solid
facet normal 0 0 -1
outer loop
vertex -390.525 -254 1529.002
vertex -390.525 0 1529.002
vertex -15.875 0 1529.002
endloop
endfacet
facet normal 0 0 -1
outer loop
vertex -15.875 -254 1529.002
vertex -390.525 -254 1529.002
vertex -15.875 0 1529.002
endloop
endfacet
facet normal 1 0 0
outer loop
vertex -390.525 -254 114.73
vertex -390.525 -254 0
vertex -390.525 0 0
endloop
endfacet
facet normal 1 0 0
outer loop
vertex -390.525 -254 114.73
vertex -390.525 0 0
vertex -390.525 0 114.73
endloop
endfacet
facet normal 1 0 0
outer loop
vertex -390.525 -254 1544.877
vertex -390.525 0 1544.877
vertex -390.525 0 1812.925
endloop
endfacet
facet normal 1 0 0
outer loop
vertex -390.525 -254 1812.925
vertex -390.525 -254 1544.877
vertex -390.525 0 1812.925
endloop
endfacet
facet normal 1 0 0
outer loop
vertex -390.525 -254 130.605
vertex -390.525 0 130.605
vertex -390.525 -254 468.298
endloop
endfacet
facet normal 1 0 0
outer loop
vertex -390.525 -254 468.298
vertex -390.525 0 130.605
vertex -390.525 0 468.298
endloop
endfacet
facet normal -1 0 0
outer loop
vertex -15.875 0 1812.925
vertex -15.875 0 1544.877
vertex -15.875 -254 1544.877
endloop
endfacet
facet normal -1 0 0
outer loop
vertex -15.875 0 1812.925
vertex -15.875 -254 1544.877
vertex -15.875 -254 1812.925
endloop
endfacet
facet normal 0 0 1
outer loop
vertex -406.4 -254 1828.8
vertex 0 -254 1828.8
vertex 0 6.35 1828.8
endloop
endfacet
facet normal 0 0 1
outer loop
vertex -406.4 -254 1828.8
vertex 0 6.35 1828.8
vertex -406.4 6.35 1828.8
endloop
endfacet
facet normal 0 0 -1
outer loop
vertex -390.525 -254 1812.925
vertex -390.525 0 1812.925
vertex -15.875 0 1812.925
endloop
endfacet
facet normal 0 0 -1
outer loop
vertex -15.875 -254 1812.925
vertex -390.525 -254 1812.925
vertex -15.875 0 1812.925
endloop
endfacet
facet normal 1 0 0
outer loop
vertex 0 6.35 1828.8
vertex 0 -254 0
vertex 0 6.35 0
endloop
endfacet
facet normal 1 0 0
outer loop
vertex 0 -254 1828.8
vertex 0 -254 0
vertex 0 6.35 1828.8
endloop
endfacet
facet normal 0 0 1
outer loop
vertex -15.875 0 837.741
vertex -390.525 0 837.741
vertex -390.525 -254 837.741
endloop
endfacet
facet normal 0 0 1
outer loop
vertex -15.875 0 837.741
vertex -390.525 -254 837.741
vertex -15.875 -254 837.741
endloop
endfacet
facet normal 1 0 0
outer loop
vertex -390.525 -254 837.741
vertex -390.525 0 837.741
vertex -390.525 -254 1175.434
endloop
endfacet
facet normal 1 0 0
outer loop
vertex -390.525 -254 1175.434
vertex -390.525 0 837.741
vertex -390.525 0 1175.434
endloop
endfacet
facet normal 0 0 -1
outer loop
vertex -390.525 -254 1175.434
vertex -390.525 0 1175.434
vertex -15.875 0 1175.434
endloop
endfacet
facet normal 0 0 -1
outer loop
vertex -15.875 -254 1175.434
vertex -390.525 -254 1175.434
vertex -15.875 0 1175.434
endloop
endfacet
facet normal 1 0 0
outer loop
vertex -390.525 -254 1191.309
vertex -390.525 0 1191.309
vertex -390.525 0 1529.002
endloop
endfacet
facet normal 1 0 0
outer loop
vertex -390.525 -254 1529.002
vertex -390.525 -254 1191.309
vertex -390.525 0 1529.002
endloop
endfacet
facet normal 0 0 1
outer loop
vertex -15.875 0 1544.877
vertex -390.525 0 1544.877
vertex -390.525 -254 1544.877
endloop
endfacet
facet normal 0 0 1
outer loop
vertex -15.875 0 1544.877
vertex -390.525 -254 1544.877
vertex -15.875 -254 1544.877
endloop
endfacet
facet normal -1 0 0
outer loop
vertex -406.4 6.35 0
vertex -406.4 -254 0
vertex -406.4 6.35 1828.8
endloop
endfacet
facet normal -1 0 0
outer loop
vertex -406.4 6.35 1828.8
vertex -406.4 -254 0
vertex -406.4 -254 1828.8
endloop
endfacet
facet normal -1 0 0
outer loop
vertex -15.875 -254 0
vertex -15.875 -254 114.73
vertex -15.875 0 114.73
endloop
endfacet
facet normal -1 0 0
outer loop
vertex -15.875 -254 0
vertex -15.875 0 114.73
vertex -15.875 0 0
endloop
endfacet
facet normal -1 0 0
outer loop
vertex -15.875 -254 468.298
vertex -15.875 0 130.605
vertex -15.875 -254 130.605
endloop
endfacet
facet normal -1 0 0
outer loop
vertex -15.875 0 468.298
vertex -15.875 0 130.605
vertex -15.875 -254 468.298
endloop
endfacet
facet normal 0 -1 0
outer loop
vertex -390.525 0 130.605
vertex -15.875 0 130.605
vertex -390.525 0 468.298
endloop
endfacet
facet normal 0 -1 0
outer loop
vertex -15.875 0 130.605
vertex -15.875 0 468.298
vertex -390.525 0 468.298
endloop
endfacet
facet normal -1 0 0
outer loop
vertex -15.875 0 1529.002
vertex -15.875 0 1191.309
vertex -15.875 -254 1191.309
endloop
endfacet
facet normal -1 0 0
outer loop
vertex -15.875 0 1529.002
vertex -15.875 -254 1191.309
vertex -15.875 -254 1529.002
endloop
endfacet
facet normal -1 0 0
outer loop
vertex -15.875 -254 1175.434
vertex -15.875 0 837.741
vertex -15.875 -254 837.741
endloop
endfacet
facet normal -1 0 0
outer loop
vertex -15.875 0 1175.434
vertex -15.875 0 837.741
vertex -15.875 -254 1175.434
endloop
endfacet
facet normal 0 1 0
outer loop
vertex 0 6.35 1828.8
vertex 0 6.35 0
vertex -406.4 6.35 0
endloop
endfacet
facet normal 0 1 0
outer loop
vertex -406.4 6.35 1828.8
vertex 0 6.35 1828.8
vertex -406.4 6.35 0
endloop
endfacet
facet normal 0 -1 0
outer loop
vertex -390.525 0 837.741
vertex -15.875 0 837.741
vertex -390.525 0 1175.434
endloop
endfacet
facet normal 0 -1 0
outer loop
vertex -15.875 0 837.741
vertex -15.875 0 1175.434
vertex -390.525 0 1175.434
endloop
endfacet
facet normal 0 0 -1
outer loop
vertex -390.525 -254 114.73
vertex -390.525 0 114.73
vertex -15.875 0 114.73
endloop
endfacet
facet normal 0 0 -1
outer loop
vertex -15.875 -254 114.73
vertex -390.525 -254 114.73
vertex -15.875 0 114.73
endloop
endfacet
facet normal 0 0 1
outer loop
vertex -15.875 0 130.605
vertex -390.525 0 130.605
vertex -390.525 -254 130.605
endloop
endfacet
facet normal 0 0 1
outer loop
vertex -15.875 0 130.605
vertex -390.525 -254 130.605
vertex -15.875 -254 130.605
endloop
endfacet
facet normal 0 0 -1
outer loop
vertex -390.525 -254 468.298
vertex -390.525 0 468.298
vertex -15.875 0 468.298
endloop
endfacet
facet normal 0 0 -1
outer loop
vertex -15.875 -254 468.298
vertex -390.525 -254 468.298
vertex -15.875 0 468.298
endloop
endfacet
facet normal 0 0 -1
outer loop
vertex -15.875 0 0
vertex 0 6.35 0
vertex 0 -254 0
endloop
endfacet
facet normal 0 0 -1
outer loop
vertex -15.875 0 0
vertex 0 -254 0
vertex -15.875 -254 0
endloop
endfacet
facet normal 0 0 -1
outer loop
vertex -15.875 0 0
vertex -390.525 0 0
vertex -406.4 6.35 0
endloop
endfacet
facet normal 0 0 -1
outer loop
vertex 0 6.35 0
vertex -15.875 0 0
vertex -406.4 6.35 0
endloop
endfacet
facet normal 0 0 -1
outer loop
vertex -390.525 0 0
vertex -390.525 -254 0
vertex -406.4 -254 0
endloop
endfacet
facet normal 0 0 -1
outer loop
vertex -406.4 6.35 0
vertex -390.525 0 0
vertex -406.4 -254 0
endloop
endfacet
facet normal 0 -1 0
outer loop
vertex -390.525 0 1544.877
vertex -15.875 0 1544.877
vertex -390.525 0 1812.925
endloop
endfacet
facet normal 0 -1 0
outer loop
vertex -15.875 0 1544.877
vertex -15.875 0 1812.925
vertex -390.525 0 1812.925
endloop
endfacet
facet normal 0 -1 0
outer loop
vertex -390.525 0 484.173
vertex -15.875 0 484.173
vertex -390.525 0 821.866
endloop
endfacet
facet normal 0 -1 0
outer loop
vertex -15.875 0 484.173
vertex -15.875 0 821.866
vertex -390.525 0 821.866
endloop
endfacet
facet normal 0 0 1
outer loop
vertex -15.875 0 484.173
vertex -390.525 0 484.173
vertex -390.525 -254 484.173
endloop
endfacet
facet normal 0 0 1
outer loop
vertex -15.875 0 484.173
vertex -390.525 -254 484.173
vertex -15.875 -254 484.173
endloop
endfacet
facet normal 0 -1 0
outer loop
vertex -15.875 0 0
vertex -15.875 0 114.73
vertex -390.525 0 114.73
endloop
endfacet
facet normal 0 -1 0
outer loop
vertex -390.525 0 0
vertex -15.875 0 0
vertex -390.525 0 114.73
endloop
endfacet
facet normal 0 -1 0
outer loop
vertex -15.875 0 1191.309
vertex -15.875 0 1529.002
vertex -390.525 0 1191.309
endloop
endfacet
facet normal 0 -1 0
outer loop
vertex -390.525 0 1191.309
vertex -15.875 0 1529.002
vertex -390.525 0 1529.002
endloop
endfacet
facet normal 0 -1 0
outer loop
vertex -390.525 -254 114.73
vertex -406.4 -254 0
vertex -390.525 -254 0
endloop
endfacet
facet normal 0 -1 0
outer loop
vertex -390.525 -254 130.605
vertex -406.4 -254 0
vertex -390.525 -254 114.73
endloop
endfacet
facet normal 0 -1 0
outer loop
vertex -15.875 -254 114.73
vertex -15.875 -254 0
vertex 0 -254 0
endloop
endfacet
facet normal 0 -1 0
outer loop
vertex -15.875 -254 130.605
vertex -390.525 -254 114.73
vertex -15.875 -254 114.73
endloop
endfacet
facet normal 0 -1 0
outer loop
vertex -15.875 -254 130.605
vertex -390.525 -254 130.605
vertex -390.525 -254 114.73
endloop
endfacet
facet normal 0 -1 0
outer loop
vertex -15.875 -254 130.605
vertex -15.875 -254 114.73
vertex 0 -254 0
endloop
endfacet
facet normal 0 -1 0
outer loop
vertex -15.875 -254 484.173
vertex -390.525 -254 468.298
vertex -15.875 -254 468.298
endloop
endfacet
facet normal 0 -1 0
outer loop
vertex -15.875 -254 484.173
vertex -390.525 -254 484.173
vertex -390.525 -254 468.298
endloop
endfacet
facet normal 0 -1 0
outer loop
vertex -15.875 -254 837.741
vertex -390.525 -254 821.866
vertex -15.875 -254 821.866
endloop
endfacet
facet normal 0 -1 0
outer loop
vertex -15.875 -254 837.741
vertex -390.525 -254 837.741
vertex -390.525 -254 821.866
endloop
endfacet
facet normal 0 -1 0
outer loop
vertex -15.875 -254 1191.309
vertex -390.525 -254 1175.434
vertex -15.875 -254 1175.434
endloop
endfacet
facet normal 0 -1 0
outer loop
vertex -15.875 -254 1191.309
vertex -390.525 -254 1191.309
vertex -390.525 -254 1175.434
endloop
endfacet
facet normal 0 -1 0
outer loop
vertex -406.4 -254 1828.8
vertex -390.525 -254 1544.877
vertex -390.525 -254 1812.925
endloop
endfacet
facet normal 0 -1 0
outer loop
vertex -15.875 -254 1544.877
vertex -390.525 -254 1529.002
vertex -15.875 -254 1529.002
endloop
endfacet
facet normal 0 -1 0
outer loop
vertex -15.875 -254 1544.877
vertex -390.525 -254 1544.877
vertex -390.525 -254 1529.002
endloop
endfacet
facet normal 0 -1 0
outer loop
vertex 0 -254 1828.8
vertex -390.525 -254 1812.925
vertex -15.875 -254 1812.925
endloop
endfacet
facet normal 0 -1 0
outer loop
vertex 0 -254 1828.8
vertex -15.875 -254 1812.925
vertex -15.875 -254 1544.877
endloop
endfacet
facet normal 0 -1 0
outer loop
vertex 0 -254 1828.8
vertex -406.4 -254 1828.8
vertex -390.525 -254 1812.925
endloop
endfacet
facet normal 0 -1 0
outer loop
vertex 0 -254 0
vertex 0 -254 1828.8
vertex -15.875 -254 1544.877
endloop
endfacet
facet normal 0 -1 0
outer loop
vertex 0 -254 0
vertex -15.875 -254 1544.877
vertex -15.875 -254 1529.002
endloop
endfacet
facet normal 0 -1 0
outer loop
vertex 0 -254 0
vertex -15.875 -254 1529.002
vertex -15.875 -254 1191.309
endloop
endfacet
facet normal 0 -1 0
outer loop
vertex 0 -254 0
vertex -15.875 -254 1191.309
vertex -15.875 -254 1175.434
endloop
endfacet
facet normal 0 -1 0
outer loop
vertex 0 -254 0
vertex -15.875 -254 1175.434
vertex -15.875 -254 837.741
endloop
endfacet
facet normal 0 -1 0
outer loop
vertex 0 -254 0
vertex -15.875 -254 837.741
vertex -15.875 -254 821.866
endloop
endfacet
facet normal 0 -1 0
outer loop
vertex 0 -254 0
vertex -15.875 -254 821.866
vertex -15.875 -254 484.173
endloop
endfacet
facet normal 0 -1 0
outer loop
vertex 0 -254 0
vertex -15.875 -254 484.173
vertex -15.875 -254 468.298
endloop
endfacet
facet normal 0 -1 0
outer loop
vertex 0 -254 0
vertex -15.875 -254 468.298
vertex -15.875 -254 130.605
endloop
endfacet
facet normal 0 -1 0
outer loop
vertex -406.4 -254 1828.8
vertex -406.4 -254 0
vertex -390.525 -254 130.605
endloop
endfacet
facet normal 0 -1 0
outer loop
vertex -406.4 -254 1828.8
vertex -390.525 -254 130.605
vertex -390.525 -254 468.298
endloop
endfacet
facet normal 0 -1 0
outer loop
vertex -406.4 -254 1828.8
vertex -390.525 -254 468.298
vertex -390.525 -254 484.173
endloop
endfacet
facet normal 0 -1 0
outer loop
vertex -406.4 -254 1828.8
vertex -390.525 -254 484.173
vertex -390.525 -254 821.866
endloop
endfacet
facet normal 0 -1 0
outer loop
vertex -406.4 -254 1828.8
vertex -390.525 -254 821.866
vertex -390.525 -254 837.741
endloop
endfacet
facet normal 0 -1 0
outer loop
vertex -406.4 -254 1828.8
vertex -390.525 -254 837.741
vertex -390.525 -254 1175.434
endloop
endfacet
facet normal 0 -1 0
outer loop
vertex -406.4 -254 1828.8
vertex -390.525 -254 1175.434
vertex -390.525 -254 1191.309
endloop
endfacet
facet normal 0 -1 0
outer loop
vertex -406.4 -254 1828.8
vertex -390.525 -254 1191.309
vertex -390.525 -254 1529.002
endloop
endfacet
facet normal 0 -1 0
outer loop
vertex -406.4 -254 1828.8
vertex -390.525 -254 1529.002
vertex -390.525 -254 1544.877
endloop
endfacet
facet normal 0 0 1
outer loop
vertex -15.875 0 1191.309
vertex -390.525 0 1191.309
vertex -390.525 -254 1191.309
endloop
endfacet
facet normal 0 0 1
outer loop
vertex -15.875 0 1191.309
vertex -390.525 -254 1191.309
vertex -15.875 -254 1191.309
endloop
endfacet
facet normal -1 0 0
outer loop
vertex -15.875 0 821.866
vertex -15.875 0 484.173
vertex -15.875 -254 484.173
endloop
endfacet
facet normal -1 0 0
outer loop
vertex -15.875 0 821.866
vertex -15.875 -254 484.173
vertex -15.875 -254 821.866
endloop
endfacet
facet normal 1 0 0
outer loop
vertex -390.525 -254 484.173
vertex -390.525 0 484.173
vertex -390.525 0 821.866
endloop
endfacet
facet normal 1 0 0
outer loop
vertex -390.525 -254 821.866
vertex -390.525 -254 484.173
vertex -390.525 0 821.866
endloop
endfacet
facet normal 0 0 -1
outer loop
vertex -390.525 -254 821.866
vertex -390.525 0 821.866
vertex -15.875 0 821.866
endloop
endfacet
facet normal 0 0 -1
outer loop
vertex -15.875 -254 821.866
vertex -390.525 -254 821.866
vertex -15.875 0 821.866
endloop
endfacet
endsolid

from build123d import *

# Parameters (mm, degrees)
F0_W     = 374.65
F0_H     = 337.693
F0_H_2   = 268.047813
F1_DEPTH = 254
F2_W     = 406.4
F2_H     = 1828.8
F3_DEPTH = 6.35


with BuildPart() as f1:
    # F0 (on Front) → F1 (new body)
    with BuildSketch(Plane.XZ):
        Polygon((-15.875, 0), (0, 0), (0, 1828.8), (-15.875, 1828.8), (-390.525, 1828.8), (-406.4, 1828.8), (-406.4, 0), (-390.525, 0), (-390.525, 114.730187), (-15.875, 114.730187), align=None)
        with Locations((-203.2, 299.451687)):
            Rectangle(F0_W, F0_H, mode=Mode.SUBTRACT)
        with Locations((-203.2, 653.019687)):
            Rectangle(F0_W, F0_H, mode=Mode.SUBTRACT)
        with Locations((-203.2, 1006.587687)):
            Rectangle(F0_W, F0_H, mode=Mode.SUBTRACT)
        with Locations((-203.2, 1360.155687)):
            Rectangle(F0_W, F0_H, mode=Mode.SUBTRACT)
        with Locations((-203.2, 1678.901093)):
            Rectangle(F0_W, F0_H_2, mode=Mode.SUBTRACT)
    extrude(amount=F1_DEPTH)

    # F2 (on face) → F3 (join)
    with BuildSketch(Plane(origin=(0, 0, 0), x_dir=(-1, 0, 0), z_dir=(0, 1, 0))):
        with Locations((203.2, 914.4)):
            Rectangle(F2_W, F2_H)
    extrude(amount=F3_DEPTH)


solid = f1.part
